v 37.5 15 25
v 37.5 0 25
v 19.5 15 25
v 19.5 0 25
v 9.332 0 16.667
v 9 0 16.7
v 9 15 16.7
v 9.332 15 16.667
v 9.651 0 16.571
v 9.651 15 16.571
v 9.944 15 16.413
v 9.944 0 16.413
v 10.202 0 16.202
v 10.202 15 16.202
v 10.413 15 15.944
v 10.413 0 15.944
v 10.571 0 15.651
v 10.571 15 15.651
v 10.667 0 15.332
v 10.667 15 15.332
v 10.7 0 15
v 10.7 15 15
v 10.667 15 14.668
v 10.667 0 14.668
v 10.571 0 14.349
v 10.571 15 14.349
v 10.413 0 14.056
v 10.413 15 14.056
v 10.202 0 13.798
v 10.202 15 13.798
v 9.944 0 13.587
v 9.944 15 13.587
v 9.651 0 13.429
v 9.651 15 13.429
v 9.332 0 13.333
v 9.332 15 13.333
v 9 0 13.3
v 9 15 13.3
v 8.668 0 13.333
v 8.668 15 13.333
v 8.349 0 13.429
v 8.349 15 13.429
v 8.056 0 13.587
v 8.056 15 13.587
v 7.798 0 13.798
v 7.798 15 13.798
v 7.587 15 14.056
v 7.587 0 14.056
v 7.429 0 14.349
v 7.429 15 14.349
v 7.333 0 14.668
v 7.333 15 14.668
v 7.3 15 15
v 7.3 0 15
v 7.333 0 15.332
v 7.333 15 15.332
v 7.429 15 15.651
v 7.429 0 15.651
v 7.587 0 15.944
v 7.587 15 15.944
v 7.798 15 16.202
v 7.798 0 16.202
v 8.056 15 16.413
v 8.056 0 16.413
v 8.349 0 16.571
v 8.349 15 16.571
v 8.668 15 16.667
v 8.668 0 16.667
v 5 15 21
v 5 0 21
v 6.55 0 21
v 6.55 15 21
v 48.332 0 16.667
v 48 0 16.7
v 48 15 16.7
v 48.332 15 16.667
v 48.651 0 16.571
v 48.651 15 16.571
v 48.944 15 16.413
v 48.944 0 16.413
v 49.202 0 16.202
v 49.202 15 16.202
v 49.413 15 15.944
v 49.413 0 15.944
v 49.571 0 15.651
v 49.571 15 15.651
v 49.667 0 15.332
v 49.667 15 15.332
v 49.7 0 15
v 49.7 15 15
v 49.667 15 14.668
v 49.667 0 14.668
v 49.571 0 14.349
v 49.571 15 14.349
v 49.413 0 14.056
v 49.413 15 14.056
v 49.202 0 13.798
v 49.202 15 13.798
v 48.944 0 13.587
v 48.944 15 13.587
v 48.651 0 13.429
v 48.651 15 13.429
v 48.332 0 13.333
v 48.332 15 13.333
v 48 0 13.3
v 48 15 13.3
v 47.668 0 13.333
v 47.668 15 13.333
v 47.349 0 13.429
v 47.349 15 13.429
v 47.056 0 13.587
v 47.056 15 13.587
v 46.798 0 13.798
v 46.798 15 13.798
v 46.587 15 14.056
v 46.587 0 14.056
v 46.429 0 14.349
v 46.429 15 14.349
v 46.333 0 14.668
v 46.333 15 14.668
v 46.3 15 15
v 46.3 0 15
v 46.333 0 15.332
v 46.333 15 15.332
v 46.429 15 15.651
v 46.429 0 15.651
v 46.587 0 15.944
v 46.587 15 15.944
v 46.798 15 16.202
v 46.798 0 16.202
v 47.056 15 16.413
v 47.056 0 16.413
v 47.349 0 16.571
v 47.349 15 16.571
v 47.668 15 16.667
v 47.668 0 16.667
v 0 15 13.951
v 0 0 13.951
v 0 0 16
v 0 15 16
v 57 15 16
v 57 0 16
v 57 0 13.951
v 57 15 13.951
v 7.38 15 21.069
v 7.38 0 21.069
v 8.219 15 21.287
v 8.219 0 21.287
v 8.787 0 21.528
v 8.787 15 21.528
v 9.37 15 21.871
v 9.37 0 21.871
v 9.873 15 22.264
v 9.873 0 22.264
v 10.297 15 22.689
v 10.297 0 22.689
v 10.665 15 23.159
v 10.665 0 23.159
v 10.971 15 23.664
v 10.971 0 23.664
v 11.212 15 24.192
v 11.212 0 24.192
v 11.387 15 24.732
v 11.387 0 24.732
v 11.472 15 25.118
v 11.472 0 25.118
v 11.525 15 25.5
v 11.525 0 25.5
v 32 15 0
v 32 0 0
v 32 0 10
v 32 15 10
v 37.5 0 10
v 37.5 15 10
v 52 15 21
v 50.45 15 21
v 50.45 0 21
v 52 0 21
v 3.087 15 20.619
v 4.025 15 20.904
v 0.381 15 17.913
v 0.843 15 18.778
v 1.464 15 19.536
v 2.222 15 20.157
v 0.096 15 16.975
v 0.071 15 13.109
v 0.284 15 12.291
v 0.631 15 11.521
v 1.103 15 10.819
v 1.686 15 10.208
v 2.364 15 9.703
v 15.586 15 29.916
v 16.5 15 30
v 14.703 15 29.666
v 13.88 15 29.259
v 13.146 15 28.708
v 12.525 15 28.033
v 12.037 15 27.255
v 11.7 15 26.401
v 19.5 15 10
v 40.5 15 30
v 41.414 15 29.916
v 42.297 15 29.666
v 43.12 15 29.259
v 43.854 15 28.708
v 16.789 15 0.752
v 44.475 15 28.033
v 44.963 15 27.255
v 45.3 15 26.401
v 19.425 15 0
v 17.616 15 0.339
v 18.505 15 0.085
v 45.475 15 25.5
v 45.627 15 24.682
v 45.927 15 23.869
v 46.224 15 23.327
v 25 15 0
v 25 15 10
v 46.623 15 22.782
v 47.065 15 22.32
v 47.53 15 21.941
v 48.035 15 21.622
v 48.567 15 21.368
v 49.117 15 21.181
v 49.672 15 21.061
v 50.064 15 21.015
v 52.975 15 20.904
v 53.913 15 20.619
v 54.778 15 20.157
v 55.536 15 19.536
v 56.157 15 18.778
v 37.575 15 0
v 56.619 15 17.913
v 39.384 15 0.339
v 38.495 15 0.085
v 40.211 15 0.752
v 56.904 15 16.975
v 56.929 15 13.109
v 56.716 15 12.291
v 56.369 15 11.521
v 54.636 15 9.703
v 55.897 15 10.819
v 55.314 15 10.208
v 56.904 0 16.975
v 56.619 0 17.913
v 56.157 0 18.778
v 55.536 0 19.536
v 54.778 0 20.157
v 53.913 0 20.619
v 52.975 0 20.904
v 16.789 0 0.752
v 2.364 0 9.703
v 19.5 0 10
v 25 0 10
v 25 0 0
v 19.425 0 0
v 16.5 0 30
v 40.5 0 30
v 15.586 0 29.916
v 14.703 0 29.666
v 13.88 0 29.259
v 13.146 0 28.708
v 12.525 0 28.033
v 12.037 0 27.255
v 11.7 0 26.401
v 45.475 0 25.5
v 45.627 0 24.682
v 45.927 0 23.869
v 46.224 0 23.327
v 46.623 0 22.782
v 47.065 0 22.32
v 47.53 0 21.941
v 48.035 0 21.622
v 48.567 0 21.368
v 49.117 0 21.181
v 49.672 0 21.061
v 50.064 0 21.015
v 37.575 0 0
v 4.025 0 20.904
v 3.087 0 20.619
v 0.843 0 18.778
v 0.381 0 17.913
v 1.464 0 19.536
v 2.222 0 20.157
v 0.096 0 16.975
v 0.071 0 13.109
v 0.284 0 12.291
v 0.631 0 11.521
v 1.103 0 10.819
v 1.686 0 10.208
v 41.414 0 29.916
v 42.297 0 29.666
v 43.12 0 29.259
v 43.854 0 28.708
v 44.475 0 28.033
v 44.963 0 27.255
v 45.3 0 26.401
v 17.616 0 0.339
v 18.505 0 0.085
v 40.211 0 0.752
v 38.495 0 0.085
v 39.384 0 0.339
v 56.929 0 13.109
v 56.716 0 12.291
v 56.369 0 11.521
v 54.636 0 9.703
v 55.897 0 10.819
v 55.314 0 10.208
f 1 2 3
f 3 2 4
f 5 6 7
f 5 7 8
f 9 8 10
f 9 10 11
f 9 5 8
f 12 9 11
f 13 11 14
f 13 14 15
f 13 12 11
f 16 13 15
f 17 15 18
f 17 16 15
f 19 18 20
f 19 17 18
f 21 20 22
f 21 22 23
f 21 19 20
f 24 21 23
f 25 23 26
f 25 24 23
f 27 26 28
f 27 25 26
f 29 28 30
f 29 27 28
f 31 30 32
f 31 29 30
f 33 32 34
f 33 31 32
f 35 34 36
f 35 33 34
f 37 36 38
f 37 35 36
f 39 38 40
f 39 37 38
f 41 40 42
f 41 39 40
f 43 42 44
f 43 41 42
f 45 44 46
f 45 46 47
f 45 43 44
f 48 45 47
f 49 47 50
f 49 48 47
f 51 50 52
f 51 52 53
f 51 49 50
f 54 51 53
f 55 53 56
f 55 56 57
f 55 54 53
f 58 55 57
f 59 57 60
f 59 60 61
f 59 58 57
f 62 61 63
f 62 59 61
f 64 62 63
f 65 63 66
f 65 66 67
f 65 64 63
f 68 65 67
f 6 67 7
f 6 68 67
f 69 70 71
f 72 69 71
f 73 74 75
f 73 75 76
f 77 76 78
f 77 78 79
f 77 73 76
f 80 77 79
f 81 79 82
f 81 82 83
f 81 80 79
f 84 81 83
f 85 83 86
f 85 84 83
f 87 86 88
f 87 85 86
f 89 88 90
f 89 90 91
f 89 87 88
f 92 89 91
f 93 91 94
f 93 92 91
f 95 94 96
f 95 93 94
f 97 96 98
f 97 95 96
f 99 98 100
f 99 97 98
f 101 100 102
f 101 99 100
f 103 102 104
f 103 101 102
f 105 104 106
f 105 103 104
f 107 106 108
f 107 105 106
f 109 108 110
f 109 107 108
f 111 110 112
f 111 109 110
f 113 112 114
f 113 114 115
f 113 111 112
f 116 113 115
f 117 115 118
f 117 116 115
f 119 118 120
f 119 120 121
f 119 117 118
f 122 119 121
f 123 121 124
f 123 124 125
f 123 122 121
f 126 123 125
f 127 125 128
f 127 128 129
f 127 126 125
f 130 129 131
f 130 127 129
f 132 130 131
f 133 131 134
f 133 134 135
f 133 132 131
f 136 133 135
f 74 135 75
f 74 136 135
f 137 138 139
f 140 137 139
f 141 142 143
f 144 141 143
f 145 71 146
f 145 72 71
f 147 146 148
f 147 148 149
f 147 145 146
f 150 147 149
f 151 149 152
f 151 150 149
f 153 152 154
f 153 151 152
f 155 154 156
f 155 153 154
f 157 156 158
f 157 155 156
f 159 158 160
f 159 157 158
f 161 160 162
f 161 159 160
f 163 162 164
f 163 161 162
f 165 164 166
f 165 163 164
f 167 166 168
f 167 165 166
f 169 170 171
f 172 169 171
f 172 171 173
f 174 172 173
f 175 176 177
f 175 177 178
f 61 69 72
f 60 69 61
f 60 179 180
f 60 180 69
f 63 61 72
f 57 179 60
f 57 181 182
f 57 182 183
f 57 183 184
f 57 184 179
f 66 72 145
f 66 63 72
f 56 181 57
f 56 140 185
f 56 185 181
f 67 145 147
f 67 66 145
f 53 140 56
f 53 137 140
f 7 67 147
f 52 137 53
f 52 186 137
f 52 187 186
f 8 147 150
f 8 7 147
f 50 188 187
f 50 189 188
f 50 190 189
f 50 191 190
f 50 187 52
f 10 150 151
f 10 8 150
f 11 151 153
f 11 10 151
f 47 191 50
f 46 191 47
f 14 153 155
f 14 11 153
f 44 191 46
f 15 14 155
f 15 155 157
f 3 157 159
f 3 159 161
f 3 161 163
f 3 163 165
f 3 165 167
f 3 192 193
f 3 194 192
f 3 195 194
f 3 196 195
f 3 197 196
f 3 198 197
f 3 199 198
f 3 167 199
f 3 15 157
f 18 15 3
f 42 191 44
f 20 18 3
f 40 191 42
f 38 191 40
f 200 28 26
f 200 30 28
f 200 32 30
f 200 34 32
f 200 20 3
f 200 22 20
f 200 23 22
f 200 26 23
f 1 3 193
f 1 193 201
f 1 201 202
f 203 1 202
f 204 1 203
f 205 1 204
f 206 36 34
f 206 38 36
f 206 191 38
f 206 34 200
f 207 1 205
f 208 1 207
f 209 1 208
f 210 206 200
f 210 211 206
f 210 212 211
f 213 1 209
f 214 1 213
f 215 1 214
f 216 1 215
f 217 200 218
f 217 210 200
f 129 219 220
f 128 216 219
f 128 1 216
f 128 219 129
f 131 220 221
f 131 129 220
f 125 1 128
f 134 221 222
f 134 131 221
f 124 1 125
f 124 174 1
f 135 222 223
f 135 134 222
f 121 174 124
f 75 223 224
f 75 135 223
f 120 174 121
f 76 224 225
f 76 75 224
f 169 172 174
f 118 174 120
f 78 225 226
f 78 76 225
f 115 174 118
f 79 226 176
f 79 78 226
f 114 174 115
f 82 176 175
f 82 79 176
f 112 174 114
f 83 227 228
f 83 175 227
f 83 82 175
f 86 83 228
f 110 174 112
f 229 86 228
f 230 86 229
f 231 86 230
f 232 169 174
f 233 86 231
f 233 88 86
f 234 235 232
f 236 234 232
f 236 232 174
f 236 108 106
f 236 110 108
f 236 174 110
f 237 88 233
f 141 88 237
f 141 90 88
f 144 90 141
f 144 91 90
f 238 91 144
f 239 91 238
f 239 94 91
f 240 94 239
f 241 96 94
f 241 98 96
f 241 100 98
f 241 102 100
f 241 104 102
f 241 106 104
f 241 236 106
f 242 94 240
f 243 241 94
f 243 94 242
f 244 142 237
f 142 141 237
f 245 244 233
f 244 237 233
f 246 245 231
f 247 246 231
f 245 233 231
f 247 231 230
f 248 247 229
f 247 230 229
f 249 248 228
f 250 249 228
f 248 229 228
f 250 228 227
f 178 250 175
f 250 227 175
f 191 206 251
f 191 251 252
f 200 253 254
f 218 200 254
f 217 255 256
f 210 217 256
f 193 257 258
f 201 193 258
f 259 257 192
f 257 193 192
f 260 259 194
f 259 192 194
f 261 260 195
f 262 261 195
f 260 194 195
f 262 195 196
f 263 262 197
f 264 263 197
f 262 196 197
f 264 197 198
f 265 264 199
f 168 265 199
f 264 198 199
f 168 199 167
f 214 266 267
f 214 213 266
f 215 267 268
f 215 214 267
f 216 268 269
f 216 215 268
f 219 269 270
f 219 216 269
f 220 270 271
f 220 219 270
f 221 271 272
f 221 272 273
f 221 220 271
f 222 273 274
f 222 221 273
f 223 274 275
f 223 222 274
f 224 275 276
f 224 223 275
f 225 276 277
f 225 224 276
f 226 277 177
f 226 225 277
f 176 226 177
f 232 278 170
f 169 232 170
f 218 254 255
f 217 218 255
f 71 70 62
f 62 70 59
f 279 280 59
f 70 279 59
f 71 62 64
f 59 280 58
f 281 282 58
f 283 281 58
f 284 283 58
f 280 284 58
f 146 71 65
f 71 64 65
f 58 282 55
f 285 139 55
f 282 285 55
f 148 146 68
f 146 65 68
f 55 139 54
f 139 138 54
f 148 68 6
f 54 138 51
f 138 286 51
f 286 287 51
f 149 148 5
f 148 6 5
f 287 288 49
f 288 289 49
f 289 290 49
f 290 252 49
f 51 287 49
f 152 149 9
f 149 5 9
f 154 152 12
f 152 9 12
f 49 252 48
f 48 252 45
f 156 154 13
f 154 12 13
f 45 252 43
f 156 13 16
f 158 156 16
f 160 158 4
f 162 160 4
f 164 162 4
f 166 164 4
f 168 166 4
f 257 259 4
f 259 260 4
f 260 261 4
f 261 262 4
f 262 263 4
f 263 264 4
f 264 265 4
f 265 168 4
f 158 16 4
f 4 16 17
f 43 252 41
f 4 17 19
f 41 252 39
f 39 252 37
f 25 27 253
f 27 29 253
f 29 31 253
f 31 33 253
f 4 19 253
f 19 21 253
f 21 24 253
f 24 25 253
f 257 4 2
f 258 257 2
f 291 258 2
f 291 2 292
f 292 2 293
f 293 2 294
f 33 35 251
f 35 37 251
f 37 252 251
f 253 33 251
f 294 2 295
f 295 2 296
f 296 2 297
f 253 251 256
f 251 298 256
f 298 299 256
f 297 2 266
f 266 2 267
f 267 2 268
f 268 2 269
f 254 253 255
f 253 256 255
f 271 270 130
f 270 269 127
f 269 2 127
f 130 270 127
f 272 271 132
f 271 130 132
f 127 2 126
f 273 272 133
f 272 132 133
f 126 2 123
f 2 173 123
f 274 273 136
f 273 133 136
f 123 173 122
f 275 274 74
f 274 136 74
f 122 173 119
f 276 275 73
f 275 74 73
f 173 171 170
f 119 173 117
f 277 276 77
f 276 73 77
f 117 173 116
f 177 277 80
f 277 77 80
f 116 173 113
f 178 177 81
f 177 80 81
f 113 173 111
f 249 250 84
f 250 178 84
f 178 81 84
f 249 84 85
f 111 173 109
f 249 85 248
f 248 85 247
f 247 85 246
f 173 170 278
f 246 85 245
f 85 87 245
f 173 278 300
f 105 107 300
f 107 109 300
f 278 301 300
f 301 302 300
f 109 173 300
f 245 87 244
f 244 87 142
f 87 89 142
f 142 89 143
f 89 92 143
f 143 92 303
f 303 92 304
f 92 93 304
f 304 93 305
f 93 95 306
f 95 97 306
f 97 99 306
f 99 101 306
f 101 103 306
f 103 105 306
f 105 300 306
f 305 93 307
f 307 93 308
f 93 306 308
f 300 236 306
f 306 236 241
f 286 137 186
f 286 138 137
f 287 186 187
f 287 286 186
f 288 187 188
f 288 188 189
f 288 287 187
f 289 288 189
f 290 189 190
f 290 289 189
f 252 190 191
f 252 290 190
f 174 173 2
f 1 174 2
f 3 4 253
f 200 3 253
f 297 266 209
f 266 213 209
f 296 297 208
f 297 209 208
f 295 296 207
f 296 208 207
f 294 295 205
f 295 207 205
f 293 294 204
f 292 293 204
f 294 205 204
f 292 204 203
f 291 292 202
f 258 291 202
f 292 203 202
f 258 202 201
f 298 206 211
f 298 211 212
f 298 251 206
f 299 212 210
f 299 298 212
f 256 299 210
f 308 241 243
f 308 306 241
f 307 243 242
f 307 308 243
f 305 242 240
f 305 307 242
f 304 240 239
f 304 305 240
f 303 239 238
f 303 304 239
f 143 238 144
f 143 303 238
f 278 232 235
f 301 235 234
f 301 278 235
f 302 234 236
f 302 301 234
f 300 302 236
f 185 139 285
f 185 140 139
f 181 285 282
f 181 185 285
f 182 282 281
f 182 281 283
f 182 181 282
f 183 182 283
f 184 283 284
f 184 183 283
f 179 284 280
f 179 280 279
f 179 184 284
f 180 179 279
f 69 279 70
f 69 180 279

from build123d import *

# Parameters (mm, degrees)
SKETCH_1_R          = 1.7
EXTRUDE_1_DEPTH     = 15
CUT_EXTRUDE_1_DEPTH = 19
FILLET_2_R          = 5
FILLET_3_R          = 5


with BuildPart() as part:
    # 草图1 → 凸台-拉伸1 (new body)
    with BuildSketch(Plane(origin=(0, 0, 0), x_dir=(1, 0, 0), z_dir=(0, 1, 0))):
        Polygon((0, 0), (0, -21), (11.5, -21), (11.5, -30), (45.5, -30), (45.5, -21), (57, -21), (57, 0), (32, 0), (32, -10), (37.5, -10), (37.5, -25), (19.5, -25), (19.5, -10), (25, -10), (25, 0), align=None)
        with Locations(Location((9, -15, 0), (0, 0, 270))):
            Circle(SKETCH_1_R, mode=Mode.SUBTRACT)
        with Locations(Location((48, -15, 0), (0, 0, 270))):
            Circle(SKETCH_1_R, mode=Mode.SUBTRACT)
    extrude(amount=EXTRUDE_1_DEPTH)

    # 草图2 → 切除-拉伸1 (cut)
    with BuildSketch(Plane(origin=(0, 15, 0), x_dir=(1, 0, 0), z_dir=(0, 1, 0))):
        Polygon((18, 0), (0, -11.169748071), (0, 0), align=None)
        Polygon((57, 0), (39, 0), (57, -11.169748071), align=None)
    extrude(amount=-CUT_EXTRUDE_1_DEPTH, mode=Mode.SUBTRACT)

    # 圆角2
    fillet_2_edges = [part.edges().sort_by_distance(p)[0] for p in [
        (57, 7.5, 21),
        (45.5, 7.5, 30),
        (11.5, 7.5, 30),
        (0, 7.5, 21),
        (39, 7.5, 0),
        (0, 7.5, 11.169748071),
        (18, 7.5, 0),
        (57, 7.5, 11.169748071),
    ]]
    fillet(fillet_2_edges, radius=FILLET_2_R)

    # 圆角3
    fillet_3_edges = [part.edges().sort_by_distance(p)[0] for p in [
        (45.5, 7.5, 21),
        (11.5, 7.5, 21),
    ]]
    fillet(fillet_3_edges, radius=FILLET_3_R)


solid = part.part
